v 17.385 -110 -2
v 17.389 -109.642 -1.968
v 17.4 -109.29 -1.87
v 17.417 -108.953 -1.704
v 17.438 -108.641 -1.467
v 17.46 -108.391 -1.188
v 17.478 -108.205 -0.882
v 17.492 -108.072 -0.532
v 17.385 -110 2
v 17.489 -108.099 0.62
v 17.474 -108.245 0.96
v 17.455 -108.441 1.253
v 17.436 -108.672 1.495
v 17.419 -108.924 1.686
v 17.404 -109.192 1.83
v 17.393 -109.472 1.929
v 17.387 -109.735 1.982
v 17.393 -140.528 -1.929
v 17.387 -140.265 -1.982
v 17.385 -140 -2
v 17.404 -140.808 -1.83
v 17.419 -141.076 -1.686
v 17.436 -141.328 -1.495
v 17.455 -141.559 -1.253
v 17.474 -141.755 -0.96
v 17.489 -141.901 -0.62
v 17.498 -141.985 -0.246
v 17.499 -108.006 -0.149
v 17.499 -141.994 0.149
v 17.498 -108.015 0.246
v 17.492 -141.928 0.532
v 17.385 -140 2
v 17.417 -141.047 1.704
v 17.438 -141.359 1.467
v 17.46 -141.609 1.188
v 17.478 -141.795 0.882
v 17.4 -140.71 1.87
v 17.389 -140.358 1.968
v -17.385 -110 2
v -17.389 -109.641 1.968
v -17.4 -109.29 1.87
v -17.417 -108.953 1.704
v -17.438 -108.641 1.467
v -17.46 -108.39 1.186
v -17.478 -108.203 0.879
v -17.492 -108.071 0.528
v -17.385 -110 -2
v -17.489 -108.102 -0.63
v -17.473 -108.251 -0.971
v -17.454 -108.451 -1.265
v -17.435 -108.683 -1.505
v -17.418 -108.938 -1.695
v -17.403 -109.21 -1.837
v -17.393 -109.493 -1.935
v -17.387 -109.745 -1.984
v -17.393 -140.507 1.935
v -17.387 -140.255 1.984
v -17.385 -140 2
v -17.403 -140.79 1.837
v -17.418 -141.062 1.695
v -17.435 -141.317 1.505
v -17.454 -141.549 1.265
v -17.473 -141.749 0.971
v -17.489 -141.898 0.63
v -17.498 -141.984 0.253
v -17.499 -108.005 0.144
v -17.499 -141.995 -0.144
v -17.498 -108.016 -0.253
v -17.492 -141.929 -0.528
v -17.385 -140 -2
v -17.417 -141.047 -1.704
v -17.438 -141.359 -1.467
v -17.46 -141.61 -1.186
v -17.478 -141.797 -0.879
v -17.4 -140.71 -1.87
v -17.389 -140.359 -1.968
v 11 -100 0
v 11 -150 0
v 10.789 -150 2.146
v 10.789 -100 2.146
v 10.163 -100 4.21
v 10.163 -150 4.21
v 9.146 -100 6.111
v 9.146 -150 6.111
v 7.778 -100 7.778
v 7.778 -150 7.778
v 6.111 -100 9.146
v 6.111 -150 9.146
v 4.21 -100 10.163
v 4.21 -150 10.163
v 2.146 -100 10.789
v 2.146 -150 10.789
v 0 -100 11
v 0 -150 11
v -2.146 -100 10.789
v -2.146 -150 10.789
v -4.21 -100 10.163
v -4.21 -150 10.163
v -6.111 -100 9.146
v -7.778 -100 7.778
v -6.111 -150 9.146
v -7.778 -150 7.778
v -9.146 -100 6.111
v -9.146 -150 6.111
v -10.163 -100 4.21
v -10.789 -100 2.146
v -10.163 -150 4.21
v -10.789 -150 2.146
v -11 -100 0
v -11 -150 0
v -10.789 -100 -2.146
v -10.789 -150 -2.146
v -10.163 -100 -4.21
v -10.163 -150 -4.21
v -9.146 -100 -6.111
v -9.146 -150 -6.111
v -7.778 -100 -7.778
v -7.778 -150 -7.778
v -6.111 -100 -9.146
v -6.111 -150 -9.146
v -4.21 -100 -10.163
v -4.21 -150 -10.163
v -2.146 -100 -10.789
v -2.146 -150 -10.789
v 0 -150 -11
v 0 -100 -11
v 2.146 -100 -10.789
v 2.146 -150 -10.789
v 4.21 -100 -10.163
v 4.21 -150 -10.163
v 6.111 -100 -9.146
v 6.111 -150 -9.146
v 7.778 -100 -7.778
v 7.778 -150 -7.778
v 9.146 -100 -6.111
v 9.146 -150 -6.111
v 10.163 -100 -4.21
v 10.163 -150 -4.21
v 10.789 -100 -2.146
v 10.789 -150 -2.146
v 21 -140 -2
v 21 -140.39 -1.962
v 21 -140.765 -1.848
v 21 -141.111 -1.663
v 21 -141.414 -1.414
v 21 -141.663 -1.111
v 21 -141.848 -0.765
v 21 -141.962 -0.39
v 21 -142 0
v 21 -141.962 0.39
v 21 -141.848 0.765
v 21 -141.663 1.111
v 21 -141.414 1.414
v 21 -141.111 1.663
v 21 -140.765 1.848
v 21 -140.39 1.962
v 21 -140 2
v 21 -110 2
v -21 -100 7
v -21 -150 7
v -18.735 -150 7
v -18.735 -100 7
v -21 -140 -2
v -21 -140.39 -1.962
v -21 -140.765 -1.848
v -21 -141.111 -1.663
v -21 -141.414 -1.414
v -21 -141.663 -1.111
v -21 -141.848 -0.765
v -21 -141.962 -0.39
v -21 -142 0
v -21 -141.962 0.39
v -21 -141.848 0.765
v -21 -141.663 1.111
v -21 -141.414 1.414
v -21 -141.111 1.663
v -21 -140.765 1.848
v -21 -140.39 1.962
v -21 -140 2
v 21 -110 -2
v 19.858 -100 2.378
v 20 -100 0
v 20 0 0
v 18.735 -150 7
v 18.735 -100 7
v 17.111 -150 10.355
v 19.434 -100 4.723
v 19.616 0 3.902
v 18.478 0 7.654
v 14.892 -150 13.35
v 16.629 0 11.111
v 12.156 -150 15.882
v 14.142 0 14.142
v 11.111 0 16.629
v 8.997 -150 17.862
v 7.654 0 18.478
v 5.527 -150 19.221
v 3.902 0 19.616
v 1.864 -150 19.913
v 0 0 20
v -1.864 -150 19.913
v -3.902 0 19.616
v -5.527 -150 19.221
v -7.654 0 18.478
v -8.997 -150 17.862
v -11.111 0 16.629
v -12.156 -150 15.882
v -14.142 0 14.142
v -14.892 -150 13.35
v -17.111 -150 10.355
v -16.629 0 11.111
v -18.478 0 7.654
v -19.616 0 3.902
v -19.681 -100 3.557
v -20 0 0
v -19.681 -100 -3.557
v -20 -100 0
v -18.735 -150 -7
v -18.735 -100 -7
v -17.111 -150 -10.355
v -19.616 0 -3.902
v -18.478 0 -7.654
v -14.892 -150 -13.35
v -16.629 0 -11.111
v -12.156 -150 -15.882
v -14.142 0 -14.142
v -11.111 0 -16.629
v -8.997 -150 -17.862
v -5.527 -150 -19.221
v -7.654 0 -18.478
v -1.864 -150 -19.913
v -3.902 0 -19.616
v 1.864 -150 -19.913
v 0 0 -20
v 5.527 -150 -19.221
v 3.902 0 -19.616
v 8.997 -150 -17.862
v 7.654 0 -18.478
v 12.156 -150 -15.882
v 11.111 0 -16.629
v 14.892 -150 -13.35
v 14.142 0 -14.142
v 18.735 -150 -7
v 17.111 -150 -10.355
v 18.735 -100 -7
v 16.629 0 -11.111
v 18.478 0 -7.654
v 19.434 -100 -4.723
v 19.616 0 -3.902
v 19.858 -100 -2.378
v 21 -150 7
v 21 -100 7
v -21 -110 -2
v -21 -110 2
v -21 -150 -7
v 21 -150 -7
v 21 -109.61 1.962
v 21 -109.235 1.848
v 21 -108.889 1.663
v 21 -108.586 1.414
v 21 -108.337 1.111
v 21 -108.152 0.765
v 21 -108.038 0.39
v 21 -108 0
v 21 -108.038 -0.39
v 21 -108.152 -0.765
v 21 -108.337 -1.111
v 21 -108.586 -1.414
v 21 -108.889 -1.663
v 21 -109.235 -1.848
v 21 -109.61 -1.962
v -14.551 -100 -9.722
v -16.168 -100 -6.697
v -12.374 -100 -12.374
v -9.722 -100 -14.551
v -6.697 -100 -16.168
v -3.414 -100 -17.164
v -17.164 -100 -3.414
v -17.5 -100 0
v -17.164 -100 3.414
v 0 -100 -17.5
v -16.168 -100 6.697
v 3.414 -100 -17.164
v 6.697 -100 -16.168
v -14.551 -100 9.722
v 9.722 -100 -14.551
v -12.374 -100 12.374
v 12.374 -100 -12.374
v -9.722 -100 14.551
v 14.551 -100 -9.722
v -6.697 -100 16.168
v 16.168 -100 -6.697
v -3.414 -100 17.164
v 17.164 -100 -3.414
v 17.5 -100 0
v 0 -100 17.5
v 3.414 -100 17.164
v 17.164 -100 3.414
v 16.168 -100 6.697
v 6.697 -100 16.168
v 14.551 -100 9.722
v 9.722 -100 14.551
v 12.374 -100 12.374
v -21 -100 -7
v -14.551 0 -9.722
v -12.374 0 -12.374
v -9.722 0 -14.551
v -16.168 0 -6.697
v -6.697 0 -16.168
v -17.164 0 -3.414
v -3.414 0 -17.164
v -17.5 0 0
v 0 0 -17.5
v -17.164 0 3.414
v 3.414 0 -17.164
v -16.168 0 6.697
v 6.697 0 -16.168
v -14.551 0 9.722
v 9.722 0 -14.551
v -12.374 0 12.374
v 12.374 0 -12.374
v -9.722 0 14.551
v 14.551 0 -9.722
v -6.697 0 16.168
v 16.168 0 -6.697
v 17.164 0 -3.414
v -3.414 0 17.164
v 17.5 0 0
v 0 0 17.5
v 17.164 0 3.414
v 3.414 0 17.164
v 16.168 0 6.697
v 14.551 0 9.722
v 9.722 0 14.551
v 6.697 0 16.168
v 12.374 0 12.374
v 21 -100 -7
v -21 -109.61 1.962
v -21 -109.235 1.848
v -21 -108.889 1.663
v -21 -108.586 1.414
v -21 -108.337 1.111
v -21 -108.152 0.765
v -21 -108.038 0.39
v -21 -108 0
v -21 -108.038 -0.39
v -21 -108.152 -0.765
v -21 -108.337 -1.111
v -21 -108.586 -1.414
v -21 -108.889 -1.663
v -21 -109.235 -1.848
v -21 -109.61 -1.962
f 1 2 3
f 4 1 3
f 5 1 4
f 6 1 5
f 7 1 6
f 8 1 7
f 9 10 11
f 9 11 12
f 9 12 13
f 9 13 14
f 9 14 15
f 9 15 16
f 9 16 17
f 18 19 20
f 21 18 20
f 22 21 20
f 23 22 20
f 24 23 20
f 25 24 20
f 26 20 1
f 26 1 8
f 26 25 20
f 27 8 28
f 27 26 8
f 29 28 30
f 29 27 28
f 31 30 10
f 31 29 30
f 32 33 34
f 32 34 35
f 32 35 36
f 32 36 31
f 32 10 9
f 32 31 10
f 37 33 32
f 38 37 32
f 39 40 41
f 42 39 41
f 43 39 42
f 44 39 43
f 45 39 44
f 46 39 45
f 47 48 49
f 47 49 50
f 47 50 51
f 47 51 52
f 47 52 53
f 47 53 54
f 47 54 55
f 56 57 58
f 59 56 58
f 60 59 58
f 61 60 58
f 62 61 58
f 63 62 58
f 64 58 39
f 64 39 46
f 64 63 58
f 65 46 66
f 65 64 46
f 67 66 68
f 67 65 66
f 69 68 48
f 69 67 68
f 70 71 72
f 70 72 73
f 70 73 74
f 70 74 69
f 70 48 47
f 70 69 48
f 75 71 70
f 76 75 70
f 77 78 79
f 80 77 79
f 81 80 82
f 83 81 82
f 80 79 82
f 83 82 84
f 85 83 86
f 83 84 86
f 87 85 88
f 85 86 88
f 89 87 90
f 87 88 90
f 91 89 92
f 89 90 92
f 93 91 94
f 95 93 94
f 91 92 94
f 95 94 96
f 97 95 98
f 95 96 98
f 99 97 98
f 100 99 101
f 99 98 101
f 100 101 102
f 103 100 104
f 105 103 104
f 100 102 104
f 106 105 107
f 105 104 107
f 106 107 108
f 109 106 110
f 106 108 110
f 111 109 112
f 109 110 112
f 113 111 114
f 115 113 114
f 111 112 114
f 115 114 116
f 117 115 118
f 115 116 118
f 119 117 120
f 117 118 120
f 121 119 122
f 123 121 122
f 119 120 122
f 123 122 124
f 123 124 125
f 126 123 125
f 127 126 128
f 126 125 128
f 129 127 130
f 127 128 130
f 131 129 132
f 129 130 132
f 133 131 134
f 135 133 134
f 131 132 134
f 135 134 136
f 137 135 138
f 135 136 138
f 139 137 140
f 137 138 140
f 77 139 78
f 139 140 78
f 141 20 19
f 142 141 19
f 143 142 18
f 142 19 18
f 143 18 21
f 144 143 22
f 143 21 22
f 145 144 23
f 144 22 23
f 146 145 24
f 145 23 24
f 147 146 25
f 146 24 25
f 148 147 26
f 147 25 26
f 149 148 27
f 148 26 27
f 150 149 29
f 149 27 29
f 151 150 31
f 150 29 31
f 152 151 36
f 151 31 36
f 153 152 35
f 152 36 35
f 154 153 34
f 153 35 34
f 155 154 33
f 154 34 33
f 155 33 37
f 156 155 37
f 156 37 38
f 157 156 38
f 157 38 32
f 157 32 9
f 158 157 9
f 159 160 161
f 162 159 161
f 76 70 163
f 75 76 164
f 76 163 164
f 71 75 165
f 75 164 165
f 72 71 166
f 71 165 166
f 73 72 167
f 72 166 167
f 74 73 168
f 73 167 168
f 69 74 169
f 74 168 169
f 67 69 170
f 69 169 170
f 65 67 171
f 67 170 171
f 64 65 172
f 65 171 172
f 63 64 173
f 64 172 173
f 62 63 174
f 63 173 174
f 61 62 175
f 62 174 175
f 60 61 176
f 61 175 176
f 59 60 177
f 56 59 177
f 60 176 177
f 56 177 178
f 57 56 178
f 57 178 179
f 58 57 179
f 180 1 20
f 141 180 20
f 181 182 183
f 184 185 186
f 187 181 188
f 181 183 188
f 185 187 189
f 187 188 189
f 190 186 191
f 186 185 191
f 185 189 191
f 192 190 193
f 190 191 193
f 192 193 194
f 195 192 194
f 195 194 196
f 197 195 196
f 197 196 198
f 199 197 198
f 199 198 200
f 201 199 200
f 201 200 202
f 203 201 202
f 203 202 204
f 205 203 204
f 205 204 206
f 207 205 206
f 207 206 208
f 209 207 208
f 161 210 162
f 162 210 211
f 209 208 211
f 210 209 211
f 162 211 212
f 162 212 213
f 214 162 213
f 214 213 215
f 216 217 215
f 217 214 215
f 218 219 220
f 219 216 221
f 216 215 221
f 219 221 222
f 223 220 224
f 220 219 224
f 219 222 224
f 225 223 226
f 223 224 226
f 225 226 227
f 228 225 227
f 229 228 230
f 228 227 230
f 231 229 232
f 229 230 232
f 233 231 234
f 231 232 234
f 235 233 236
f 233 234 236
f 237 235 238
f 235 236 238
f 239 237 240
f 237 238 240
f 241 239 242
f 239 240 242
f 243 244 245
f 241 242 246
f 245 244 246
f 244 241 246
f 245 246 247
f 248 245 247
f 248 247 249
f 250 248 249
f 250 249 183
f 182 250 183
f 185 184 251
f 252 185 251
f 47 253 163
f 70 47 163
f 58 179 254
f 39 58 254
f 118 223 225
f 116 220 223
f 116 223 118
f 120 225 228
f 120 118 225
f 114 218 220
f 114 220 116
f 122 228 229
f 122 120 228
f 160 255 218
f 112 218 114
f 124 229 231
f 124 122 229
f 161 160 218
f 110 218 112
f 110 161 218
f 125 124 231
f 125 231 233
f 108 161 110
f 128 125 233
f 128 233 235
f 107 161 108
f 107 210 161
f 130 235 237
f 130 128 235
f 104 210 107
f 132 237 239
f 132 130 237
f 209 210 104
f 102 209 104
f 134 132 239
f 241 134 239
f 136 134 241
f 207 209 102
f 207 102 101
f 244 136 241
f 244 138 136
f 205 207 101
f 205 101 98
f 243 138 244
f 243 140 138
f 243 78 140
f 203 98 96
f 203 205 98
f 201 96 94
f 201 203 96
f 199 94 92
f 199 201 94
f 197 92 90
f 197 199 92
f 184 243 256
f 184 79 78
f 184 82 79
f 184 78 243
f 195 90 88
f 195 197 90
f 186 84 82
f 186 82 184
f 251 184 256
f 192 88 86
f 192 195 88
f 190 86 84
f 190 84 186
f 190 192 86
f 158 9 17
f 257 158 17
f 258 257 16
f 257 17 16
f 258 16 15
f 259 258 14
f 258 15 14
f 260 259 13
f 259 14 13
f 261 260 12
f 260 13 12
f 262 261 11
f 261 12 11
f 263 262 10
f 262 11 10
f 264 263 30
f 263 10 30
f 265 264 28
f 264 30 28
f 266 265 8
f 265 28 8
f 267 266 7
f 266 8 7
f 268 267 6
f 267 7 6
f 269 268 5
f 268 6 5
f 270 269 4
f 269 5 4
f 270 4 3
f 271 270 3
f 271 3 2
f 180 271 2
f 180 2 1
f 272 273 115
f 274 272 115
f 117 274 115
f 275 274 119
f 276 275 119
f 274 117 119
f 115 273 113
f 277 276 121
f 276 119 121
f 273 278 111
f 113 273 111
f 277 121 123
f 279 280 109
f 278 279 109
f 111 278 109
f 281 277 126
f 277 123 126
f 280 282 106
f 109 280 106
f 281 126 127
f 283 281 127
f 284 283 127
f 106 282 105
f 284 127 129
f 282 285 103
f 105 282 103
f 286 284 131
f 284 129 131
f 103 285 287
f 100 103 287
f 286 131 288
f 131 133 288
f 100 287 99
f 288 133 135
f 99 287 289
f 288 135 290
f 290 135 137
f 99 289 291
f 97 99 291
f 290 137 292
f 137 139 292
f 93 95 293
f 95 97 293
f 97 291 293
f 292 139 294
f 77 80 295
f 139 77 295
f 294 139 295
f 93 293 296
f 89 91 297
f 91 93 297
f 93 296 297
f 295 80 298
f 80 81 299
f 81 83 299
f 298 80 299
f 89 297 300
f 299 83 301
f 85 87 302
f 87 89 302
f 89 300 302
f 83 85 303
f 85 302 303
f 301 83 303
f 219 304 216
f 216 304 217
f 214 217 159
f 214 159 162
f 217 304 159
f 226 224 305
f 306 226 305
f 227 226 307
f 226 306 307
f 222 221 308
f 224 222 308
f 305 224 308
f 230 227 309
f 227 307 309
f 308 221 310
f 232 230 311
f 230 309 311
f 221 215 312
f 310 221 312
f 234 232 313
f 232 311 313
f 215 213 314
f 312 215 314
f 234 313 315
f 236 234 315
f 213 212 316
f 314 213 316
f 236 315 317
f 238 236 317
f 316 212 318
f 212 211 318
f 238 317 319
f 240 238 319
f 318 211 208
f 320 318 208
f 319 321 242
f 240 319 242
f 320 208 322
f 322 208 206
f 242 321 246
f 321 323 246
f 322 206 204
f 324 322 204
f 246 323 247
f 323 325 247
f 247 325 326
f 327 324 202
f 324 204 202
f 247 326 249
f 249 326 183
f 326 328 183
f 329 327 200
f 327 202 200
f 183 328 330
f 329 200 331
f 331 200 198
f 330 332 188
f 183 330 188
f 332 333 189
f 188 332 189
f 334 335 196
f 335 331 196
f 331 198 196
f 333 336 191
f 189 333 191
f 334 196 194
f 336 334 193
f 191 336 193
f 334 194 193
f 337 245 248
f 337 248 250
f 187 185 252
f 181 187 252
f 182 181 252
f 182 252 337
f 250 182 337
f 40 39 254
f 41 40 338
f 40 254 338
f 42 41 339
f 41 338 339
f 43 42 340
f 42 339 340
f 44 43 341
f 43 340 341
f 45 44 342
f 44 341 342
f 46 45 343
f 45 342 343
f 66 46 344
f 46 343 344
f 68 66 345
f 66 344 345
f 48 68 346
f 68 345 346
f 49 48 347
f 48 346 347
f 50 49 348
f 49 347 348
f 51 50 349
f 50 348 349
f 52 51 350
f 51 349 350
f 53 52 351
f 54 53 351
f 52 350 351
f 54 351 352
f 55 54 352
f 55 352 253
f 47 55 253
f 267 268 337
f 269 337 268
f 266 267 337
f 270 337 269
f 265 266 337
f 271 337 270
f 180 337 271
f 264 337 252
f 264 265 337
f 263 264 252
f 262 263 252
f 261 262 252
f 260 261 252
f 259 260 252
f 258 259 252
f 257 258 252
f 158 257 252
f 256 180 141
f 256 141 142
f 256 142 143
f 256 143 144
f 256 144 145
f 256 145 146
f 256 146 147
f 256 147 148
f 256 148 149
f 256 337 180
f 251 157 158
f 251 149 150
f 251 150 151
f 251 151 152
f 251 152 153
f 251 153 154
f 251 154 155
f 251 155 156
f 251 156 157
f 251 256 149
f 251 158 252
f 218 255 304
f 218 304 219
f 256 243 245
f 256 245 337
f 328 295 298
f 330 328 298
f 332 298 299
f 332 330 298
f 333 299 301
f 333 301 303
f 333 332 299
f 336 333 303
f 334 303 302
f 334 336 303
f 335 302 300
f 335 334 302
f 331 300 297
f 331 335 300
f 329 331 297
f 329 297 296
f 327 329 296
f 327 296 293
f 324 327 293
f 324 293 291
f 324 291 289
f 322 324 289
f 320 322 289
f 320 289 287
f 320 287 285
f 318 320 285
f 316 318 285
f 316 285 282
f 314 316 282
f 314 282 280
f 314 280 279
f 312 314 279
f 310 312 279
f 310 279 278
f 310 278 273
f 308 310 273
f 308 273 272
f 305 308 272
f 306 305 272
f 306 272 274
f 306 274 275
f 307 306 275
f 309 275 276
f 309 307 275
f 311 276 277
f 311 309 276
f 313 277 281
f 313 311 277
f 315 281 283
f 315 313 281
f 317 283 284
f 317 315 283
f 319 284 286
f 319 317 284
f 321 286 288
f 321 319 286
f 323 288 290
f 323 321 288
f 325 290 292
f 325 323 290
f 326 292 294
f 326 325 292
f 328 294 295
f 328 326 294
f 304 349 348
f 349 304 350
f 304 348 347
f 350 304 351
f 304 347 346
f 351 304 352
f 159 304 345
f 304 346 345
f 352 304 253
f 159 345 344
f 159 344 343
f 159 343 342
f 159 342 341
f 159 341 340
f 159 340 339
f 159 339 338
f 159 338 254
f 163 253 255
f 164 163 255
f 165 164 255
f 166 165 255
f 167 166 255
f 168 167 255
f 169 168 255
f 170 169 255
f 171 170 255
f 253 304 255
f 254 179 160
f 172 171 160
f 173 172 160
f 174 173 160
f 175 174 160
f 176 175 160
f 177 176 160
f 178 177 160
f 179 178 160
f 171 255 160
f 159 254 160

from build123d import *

# Parameters (mm, degrees)
F0_R     = 20
F0_R_2   = 17.5
F1_DEPTH = 150
F2_W     = 2.265006
F2_H     = 14
F3_DEPTH = 50
F5_DEPTH = 42.001
F6_R     = 17.5
F6_R_2   = 11
F7_DEPTH = 50


with BuildPart() as f1:
    # F0 (on Front) → F1 (new body)
    with BuildSketch(Plane.XZ):
        Circle(F0_R)
        Circle(F0_R_2, mode=Mode.SUBTRACT)
    extrude(amount=F1_DEPTH)

    # F2 (on face) → F3 (join)
    with BuildSketch(Plane.XZ.offset(150)):
        with Locations((-19.867497, 0)):
            Rectangle(F2_W, F2_H)
        with Locations((19.867497, 0)):
            Rectangle(F2_W, F2_H)
    extrude(amount=-F3_DEPTH)

    # F4 (on face) → F5 (cut, through all)
    with BuildSketch(Plane(origin=(-21, 0, 0), x_dir=(0, -1, 0), z_dir=(-1, 0, 0))):
        with BuildLine():
            ThreePointArc((110, 2), (108, 0), (110, -2))
            Line((110, -2), (140, -2))
            ThreePointArc((140, -2), (142, 0), (140, 2))
            Line((140, 2), (110, 2))
        make_face()
    extrude(amount=-F5_DEPTH, mode=Mode.SUBTRACT)

    # F6 (on face) → F7 (join)
    with BuildSketch(Plane.XZ.offset(150)):
        Circle(F6_R)
        Circle(F6_R_2, mode=Mode.SUBTRACT)
    extrude(amount=-F7_DEPTH)


solid = f1.part
